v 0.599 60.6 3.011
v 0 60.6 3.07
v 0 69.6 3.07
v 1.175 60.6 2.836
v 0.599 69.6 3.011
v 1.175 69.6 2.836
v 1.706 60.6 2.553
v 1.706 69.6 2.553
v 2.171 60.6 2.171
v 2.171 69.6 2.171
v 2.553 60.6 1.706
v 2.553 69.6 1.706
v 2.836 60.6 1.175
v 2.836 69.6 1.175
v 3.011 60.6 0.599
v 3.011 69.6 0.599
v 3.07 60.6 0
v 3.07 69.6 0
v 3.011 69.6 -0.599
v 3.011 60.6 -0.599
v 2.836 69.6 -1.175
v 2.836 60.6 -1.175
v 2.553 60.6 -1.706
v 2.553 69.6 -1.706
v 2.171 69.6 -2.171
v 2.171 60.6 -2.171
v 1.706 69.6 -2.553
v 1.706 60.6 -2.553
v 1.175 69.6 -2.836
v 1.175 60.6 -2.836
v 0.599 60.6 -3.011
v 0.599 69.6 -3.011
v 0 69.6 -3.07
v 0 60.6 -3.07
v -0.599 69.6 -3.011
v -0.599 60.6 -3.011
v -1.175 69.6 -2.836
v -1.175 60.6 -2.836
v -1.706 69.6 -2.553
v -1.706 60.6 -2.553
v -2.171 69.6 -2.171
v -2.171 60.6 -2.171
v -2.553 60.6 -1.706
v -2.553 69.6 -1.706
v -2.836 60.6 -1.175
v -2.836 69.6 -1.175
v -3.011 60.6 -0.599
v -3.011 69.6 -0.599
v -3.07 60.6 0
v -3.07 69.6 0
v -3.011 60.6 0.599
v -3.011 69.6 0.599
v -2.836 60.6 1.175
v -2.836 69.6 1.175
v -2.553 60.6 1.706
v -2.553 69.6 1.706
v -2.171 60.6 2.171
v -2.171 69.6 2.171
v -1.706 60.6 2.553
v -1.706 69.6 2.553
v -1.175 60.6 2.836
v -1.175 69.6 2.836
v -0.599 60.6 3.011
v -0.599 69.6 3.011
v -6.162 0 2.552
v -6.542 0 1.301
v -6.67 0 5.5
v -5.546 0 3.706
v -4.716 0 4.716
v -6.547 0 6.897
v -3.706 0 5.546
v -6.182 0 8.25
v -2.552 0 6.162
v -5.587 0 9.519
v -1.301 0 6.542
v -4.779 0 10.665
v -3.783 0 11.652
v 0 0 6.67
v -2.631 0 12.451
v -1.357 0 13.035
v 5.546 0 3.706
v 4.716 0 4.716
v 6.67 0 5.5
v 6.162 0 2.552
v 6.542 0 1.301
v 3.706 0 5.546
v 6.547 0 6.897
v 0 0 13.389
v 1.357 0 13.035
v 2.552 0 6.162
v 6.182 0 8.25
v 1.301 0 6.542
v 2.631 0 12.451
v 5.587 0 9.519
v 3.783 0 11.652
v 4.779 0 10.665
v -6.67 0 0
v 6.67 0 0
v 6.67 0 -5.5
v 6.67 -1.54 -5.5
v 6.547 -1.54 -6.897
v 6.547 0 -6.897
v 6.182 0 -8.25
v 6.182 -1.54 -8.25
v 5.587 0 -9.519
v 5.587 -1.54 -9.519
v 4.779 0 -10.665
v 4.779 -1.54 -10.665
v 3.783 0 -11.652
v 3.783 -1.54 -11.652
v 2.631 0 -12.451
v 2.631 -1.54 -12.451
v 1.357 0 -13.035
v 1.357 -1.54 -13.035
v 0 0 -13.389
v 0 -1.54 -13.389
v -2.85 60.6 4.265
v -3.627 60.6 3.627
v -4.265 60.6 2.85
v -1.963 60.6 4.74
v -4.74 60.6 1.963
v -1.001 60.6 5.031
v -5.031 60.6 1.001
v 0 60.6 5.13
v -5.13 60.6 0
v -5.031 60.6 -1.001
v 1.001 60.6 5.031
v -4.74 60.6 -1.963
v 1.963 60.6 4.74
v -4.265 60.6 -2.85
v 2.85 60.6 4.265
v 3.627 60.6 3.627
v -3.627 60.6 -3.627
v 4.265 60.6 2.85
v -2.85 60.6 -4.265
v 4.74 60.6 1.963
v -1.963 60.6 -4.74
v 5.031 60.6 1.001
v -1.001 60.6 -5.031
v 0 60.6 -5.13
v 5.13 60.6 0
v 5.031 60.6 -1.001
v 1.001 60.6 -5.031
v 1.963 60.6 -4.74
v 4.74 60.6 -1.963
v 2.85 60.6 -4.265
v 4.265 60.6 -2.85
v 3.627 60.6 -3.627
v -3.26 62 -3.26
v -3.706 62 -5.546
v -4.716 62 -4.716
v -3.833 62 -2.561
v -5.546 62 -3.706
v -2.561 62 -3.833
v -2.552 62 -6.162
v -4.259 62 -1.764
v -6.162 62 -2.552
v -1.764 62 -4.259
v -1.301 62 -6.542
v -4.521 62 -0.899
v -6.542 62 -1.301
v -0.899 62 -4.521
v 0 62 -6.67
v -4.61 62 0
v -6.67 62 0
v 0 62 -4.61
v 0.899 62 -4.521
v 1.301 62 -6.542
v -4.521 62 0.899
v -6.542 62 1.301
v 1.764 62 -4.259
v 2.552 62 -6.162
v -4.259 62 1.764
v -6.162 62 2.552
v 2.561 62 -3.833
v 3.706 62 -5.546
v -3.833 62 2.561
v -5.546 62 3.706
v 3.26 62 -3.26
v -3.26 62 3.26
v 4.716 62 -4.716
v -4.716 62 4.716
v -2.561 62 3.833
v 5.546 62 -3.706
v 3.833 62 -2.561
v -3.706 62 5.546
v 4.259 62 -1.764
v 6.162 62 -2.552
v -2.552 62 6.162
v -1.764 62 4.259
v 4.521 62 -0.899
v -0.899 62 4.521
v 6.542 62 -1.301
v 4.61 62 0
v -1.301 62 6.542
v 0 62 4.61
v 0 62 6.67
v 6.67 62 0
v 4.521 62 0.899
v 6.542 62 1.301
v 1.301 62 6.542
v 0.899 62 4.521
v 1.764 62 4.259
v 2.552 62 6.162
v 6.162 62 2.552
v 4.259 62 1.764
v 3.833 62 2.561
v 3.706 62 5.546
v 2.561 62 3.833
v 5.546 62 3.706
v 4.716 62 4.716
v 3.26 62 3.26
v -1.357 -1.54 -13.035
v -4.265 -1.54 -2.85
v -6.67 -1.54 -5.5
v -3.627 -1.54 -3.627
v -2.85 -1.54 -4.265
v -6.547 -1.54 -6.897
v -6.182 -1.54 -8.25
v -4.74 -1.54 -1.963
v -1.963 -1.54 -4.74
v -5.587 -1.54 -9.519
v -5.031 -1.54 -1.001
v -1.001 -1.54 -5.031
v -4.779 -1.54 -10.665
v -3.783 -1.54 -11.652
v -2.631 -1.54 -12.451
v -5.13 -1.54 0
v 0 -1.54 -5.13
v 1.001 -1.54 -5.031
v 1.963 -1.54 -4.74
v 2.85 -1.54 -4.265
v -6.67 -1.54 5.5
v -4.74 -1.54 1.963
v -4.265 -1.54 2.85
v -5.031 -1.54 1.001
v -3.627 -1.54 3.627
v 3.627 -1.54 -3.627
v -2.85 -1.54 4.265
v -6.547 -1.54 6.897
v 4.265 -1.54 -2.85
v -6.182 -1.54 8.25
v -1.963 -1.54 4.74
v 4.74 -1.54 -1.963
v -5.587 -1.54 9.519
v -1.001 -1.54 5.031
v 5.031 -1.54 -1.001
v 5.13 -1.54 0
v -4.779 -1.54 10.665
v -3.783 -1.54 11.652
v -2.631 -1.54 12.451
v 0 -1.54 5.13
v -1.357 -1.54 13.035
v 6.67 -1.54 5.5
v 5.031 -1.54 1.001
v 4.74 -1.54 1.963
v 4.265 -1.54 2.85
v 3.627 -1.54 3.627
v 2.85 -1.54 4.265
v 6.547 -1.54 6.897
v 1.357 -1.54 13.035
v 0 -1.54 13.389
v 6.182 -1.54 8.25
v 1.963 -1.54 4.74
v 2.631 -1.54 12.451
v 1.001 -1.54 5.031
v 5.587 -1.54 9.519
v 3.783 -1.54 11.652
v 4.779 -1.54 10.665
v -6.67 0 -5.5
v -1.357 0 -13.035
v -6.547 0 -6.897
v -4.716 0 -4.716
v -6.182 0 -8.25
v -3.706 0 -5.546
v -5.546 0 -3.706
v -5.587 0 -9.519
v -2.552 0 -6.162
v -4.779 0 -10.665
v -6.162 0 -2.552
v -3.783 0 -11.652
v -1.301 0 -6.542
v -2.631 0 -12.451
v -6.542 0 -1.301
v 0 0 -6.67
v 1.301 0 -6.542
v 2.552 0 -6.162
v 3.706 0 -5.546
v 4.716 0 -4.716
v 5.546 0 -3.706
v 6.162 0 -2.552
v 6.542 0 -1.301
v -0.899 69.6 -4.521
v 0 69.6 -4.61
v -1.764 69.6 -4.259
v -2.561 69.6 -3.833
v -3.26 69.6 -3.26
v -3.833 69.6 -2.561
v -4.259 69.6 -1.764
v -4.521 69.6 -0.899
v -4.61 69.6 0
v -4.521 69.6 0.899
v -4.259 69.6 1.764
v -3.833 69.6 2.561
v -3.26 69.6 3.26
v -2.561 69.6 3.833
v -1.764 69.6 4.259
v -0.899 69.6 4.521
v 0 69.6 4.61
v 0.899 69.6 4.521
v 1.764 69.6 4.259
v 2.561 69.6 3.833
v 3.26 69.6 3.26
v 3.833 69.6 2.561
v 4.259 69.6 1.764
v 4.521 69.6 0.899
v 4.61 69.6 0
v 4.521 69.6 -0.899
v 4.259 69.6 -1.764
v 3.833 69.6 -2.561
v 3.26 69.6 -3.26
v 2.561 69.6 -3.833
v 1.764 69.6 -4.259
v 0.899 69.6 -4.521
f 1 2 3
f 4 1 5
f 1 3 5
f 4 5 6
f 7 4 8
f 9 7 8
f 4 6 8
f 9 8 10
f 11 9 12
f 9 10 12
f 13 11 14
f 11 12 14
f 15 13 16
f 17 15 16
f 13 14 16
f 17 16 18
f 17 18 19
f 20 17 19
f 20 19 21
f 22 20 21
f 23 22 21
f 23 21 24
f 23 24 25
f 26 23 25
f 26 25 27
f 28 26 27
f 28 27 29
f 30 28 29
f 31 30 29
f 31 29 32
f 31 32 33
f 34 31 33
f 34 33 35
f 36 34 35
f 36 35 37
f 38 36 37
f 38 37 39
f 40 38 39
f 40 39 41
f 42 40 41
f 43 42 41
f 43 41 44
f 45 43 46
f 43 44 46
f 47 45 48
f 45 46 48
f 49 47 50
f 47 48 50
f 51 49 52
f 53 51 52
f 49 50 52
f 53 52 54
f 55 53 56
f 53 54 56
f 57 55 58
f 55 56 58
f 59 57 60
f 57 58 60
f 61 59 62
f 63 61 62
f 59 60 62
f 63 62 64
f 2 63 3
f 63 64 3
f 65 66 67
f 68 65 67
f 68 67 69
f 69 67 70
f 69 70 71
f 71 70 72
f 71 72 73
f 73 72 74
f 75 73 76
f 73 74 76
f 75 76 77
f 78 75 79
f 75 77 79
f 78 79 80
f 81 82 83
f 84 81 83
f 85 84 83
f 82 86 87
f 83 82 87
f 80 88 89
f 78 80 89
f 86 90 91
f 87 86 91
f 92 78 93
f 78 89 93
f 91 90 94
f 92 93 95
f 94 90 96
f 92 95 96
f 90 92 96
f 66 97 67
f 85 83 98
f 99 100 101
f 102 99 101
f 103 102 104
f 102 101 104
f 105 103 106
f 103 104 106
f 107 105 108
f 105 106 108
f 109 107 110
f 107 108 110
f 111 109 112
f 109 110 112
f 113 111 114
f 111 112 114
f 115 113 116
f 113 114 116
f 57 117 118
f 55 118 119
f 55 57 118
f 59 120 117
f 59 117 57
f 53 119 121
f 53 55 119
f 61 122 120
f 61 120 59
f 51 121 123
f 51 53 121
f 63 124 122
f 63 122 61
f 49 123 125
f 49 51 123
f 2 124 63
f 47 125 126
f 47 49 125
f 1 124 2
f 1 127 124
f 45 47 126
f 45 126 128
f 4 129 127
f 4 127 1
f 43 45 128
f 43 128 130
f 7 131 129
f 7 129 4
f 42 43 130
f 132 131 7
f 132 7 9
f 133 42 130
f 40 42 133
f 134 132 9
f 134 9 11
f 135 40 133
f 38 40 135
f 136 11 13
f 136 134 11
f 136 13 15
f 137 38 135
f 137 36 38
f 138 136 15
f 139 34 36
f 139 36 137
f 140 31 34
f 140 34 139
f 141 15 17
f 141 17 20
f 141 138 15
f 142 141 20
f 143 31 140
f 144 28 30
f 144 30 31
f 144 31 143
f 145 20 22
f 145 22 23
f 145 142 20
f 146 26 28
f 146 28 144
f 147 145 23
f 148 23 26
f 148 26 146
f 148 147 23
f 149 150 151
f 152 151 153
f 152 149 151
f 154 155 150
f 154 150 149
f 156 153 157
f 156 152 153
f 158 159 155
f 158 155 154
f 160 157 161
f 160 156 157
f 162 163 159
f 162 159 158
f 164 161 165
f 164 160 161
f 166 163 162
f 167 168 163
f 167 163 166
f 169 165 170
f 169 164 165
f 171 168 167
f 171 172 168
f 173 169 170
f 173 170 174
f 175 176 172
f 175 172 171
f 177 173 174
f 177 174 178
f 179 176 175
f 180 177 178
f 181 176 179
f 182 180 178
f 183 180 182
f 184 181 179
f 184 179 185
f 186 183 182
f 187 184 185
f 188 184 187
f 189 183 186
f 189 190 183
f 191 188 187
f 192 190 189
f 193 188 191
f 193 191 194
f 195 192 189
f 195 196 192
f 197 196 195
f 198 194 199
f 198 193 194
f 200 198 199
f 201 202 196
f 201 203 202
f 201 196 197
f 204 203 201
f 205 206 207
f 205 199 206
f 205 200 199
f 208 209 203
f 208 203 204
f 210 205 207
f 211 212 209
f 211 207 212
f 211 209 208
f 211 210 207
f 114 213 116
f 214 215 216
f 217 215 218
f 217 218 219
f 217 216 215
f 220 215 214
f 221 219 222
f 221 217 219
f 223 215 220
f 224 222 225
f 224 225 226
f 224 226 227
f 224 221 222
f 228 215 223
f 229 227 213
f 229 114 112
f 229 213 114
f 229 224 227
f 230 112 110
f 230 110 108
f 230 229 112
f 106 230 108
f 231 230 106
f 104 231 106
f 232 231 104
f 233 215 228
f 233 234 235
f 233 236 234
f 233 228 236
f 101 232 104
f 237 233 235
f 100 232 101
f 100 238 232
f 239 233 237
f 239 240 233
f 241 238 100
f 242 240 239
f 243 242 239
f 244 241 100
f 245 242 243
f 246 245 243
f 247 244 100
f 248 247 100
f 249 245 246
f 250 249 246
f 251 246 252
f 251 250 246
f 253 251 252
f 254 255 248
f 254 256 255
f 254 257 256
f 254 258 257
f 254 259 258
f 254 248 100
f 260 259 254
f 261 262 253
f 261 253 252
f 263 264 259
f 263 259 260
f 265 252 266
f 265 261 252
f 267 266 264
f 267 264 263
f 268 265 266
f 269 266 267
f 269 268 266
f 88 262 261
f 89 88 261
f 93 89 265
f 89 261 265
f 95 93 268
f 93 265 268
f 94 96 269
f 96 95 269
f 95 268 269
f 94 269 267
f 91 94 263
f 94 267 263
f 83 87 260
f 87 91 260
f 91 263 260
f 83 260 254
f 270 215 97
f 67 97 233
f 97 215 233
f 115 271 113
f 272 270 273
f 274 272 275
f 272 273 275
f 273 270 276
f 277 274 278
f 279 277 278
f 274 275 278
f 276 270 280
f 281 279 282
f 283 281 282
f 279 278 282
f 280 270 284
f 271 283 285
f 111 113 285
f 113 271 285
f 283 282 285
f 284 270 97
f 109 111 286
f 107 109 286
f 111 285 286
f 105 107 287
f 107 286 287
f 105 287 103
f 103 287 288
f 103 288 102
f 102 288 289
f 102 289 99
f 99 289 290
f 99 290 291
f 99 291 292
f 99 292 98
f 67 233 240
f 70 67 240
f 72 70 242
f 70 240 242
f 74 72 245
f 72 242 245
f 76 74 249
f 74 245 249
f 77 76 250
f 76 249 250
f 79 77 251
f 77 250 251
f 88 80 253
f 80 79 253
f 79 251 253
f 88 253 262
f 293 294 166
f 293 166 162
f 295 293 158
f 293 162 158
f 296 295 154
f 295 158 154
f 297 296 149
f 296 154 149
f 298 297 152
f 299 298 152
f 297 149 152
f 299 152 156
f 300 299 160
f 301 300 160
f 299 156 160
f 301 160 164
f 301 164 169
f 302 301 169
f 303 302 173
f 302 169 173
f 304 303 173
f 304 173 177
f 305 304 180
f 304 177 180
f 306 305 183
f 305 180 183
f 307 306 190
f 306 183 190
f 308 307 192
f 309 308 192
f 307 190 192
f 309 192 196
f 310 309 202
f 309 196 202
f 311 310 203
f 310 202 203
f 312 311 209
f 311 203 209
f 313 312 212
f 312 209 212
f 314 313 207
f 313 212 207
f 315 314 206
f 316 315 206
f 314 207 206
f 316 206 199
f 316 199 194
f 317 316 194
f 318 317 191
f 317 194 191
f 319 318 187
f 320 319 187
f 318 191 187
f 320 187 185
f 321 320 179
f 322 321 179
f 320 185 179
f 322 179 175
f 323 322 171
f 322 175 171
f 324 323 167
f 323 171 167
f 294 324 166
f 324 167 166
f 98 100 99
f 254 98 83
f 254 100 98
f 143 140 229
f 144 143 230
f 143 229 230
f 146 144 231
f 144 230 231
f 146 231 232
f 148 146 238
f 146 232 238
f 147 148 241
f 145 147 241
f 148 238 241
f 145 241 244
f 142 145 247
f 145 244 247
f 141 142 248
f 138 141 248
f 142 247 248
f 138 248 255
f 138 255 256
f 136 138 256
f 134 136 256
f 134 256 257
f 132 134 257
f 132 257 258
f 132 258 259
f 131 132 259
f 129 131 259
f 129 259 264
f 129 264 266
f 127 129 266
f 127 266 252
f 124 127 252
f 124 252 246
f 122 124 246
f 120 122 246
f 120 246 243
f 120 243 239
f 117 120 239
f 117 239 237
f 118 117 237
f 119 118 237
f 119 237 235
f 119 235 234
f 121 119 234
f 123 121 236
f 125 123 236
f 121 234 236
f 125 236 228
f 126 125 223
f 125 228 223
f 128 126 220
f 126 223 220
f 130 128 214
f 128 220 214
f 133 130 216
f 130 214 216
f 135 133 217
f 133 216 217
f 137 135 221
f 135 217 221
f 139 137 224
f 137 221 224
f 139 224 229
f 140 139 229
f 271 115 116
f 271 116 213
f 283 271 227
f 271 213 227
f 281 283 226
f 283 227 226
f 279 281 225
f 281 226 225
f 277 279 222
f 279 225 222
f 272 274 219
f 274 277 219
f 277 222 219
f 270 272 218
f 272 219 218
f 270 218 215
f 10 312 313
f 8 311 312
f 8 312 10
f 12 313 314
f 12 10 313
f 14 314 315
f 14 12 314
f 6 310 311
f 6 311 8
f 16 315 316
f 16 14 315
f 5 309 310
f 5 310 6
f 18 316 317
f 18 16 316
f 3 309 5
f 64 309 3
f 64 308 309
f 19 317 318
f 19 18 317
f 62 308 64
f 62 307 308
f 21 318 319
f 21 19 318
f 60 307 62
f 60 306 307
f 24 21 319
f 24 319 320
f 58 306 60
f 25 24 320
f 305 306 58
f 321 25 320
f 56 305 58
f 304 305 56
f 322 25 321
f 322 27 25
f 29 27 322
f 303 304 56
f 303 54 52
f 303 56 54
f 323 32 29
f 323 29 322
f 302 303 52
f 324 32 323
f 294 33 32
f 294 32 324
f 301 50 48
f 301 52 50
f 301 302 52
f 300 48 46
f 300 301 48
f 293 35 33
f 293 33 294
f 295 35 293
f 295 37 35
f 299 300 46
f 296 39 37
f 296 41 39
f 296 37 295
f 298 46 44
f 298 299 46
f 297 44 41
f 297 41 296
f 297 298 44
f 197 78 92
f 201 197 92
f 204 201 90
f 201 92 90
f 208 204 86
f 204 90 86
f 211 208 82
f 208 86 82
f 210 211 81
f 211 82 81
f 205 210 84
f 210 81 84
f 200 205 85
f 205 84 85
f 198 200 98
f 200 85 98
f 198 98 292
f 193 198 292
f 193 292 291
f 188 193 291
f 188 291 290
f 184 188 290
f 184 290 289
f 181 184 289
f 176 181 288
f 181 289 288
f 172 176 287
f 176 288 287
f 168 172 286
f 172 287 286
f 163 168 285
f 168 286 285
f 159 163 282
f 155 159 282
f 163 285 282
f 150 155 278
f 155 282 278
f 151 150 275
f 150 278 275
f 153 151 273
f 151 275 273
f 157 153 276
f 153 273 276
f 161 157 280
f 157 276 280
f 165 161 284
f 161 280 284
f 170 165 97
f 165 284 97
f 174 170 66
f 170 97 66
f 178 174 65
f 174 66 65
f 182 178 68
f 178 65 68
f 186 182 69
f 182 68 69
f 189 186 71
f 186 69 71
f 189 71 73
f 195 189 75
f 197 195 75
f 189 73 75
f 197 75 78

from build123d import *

# Parameters (mm, degrees)
CROQUIS1_R              = 6.67
SALIENTE_EXTRUIR1_DEPTH = 62
CROQUIS2_R              = 4.61
SALIENTE_EXTRUIR2_DEPTH = 7.6
CROQUIS3_R              = 5.13
CORTAR_EXTRUIR1_DEPTH   = 60.6
CROQUIS4_R              = 3.07
CORTAR_EXTRUIR2_DEPTH   = 60.6
SALIENTE_EXTRUIR3_START = 1.54
CROQUIS5_W              = 13.34
CROQUIS5_H              = 27
CROQUIS5_R              = 5.13
SALIENTE_EXTRUIR3_DEPTH = 1.54
REDONDEO1_R             = 8


with BuildPart() as part:
    # Croquis1 → Saliente-Extruir1 (new body)
    with BuildSketch(Plane(origin=(0, 0, 0), x_dir=(1, 0, 0), z_dir=(0, 1, 0))):
        with Locations(Location((0, 0, 0), (0, 0, 270))):
            Circle(CROQUIS1_R)
    extrude(amount=SALIENTE_EXTRUIR1_DEPTH)

    # Croquis2 → Saliente-Extruir2 (add)
    with BuildSketch(Plane(origin=(0, 62, 0), x_dir=(1, 0, 0), z_dir=(0, 1, 0))):
        with Locations(Location((0, 0, 0), (0, 0, 90))):
            Circle(CROQUIS2_R)
    extrude(amount=SALIENTE_EXTRUIR2_DEPTH)

    # Croquis3 → Cortar-Extruir1 (cut)
    with BuildSketch(Plane.XZ):
        with Locations(Location((0, 0, 0), (0, 0, 270))):
            Circle(CROQUIS3_R)
    extrude(amount=-CORTAR_EXTRUIR1_DEPTH, mode=Mode.SUBTRACT)

    # Croquis4 → Cortar-Extruir2 (cut)
    with BuildSketch(Plane(origin=(0, 69.6, 0), x_dir=(1, 0, 0), z_dir=(0, 1, 0))):
        with Locations(Location((0, 0, 0), (0, 0, 270))):
            Circle(CROQUIS4_R)
    extrude(amount=-CORTAR_EXTRUIR2_DEPTH, mode=Mode.SUBTRACT)

    # Croquis5 → Saliente-Extruir3 (add)
    with BuildSketch(Plane.XZ.offset(SALIENTE_EXTRUIR3_START)):
        Rectangle(CROQUIS5_W, CROQUIS5_H)
        with Locations(Location((0, 0, 0), (0, 0, 270))):
            Circle(CROQUIS5_R, mode=Mode.SUBTRACT)
    extrude(amount=-SALIENTE_EXTRUIR3_DEPTH)

    # Redondeo1
    # the kernel refuses this fillet: 8 mm, written as the material it takes off along each edge
    with BuildSketch(Plane(origin=(-6.67, -21.54, -13.5), x_dir=(0, 0, 1), z_dir=(0, 1, 0)), Plane(origin=(6.67, -21.54, -13.5), x_dir=(-1, 0, 0), z_dir=(0, 1, 0)), Plane(origin=(6.67, -21.54, 13.5), x_dir=(0, 0, -1), z_dir=(0, 1, 0))) as redondeo1_piece_1:
        with BuildLine():
            CenterArc((REDONDEO1_R, REDONDEO1_R), REDONDEO1_R, 180, 90)
            Line((0, REDONDEO1_R), (0, 0))
            Line((0, 0), (REDONDEO1_R, 0))
        make_face()
    extrude(amount=41.54, mode=Mode.SUBTRACT)
    with BuildSketch(Plane(origin=(-6.67, -21.54, 13.5), x_dir=(0, 0, -1), z_dir=(0, 1, 0))) as redondeo1_piece_2:
        with BuildLine():
            CenterArc((REDONDEO1_R, -REDONDEO1_R), REDONDEO1_R, 90, 90)
            Line((0, -REDONDEO1_R), (0, 0))
            Line((0, 0), (REDONDEO1_R, 0))
        make_face()
    extrude(amount=41.54, mode=Mode.SUBTRACT)


solid = part.part
